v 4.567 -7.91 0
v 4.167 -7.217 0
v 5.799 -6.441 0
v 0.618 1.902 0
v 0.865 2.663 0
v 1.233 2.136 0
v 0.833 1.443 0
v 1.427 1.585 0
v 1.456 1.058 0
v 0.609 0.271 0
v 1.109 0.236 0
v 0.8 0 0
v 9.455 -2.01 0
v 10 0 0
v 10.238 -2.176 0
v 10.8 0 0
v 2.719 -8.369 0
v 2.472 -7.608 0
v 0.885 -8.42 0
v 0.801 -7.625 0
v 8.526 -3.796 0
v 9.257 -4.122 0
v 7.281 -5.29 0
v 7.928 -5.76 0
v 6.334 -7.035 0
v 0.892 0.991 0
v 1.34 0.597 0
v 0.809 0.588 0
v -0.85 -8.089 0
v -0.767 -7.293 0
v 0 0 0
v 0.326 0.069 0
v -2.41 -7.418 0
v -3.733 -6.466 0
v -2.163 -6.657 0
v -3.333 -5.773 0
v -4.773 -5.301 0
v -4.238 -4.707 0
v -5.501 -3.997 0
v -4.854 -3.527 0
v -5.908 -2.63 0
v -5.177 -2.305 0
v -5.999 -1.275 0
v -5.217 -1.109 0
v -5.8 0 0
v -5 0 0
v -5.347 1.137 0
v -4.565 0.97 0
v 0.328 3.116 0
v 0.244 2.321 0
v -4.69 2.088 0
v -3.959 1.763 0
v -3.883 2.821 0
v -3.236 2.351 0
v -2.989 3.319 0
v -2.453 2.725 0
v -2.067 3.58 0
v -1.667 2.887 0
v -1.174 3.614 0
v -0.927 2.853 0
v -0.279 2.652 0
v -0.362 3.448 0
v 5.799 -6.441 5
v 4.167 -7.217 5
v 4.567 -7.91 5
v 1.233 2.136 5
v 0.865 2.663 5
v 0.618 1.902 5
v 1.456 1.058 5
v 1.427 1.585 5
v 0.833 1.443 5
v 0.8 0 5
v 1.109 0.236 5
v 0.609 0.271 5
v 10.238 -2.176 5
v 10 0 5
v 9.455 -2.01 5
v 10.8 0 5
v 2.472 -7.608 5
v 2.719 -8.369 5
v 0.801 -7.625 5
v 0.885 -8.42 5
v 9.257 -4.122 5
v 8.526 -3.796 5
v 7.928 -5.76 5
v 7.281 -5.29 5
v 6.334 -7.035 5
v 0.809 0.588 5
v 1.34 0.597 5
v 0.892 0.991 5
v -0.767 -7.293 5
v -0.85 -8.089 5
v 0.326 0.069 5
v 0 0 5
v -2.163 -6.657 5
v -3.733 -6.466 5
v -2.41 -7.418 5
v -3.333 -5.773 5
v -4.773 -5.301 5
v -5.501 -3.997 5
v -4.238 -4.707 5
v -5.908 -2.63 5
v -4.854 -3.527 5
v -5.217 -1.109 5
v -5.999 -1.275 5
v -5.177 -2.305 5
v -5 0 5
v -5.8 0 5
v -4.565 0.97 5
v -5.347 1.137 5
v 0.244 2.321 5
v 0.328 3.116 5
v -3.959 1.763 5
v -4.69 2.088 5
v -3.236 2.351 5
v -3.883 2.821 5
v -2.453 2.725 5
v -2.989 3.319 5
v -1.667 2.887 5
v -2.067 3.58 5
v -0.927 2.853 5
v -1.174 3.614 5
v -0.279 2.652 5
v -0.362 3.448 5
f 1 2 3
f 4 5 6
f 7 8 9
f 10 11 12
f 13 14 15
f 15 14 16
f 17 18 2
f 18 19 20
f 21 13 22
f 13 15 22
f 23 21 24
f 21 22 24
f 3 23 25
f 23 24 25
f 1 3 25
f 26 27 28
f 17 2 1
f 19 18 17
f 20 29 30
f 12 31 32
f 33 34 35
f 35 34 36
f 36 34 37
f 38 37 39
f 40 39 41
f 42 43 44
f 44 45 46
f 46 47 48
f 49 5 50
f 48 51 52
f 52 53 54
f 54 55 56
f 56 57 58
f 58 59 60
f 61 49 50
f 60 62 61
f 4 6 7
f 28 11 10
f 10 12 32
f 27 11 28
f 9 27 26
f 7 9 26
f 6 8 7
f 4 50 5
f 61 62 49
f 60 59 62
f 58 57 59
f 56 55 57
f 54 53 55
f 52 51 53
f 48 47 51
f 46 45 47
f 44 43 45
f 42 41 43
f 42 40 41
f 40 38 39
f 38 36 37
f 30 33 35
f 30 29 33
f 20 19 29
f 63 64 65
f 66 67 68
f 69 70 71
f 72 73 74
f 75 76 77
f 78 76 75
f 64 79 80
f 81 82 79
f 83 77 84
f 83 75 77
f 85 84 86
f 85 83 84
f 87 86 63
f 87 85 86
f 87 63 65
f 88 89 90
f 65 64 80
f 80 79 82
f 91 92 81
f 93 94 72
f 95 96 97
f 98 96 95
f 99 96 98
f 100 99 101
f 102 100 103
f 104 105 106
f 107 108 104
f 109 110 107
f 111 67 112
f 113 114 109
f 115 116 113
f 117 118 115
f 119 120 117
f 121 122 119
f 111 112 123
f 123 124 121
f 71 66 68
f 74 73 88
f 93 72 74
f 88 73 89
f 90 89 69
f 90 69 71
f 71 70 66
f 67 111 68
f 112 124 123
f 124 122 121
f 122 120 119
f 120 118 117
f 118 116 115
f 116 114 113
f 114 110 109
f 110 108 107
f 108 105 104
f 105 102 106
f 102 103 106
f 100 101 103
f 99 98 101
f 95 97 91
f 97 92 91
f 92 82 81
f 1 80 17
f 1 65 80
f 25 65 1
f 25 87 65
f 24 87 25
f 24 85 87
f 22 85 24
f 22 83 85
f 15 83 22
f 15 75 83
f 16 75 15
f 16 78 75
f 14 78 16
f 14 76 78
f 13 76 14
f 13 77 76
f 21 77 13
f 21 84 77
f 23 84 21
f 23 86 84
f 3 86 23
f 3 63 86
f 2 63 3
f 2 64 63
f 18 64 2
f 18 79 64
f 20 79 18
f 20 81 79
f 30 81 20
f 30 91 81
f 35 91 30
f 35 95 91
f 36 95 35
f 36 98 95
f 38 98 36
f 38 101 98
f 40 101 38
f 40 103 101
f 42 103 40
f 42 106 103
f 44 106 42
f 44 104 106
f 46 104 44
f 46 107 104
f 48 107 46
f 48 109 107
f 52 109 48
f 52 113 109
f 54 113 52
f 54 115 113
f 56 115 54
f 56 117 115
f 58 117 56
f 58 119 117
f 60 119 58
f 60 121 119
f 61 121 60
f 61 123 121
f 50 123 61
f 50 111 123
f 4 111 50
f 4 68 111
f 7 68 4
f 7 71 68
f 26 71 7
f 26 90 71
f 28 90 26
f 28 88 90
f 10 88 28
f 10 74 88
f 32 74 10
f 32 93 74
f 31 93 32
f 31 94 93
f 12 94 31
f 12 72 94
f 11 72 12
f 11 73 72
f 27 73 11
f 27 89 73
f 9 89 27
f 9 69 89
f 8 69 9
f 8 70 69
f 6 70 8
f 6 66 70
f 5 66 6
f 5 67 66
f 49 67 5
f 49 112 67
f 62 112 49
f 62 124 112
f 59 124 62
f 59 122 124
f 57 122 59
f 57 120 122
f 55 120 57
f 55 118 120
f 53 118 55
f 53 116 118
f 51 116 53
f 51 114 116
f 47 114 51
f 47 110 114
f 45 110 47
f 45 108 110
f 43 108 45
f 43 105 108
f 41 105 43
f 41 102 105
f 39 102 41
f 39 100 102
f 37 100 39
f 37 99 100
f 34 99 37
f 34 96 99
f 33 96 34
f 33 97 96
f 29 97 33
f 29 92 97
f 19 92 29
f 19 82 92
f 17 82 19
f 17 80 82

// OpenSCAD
// spirals   = how many spirals
// thickness = how thick you want the arms to be
// rmax      = maximum radius
linear_extrude(5)
    archimedean_spiral(1,0.8,10);

module archimedean_spiral(spirals=1, thickness=1, rmax = 100){
    s = spirals*360;
    t = thickness;
    a = sqrt(pow(rmax,2)/(pow(s,2)*(pow(cos(s),2) + pow(sin(s),2))));
    points=[
        for(i = [0:$fa:s]) [
            (i*a)*cos(i),
            (i*a)*sin(i)
        ]
    ];
    points_inner=[
        for(i = [s:-$fa:0]) [
            (((i*a)+t)*cos(i)),
            (((i*a)+t)*sin(i))
        ]
    ];
    polygon(concat(points,points_inner));
}
